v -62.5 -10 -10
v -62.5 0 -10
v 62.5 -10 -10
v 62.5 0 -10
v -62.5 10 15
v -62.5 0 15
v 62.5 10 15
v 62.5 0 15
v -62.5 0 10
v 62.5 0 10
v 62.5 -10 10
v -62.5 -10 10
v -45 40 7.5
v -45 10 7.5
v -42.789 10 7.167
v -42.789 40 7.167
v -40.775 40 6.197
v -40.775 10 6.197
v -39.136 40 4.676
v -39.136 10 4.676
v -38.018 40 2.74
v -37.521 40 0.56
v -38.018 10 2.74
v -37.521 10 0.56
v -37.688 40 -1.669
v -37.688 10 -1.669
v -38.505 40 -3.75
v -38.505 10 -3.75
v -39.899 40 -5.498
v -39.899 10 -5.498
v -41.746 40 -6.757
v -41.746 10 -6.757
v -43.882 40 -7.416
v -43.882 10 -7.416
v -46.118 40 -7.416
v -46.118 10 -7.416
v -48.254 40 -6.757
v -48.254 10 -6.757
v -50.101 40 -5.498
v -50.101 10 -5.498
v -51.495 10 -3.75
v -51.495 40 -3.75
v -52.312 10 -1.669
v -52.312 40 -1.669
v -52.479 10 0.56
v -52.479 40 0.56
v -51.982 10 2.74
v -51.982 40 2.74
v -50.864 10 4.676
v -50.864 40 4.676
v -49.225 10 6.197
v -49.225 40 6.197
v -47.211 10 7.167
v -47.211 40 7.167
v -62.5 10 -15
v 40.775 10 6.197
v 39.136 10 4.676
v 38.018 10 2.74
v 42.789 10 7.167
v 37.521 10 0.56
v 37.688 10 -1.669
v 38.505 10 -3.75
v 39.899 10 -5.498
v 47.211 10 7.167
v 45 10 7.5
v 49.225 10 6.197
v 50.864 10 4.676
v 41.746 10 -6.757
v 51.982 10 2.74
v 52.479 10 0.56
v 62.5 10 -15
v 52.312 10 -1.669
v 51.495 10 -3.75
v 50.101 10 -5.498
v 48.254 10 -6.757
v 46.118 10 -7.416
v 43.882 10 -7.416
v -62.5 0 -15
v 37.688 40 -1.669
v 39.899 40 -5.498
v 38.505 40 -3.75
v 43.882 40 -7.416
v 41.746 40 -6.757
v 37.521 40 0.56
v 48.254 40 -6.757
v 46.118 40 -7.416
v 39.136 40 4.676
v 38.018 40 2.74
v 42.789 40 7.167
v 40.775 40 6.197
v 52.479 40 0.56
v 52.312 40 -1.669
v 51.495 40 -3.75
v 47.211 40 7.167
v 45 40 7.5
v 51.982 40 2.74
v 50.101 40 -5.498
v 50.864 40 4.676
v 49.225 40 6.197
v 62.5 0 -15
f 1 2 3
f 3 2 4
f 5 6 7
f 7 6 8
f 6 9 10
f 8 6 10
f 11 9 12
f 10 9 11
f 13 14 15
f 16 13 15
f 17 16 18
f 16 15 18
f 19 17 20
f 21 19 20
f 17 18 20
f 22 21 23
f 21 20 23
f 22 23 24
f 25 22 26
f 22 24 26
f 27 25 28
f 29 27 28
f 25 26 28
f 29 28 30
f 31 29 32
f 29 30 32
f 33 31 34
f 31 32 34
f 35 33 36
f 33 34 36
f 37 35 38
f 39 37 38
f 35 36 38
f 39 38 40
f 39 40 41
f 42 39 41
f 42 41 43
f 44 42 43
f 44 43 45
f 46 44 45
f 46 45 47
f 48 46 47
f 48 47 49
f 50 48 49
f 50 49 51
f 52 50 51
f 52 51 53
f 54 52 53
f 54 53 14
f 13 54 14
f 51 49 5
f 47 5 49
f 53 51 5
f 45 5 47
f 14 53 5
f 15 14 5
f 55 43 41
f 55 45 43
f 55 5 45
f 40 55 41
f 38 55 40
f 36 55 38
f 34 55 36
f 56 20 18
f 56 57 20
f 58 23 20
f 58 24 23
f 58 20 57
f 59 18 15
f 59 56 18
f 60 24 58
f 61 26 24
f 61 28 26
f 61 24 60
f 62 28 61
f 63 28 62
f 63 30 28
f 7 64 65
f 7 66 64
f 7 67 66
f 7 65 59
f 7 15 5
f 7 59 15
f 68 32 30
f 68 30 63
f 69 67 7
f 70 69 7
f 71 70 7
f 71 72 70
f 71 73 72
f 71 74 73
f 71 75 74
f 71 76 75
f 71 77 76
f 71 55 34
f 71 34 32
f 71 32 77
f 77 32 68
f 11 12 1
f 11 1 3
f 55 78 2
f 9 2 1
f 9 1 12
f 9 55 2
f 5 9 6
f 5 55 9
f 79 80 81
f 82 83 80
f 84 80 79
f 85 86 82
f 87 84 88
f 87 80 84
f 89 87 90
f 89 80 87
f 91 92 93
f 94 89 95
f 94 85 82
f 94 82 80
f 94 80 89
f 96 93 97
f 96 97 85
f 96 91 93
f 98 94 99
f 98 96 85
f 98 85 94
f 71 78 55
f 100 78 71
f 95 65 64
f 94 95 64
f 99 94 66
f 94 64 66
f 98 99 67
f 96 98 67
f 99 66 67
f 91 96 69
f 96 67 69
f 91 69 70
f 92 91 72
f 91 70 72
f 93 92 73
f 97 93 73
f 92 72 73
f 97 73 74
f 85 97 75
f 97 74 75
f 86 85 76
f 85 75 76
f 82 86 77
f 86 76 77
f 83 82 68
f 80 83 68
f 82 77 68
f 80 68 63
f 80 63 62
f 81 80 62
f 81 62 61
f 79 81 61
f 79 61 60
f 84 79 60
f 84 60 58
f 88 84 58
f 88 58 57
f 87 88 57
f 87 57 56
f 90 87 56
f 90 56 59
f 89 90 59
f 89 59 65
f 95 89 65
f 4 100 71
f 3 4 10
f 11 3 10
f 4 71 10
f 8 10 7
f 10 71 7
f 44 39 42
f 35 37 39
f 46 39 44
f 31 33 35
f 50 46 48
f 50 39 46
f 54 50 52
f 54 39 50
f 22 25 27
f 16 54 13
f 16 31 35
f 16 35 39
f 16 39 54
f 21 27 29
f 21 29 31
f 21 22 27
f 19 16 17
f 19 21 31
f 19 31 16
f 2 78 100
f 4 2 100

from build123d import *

# Parameters (mm, degrees)
SKETCH1_W           = 125
SKETCH1_H           = 30
SKETCH1_R           = 7.5
BOSS_EXTRUDE1_DEPTH = 10
SKETCH3_W           = 125
SKETCH3_H           = 20
BOSS_EXTRUDE2_DEPTH = 10
SKETCH4_R           = 7.5
BOSS_EXTRUDE3_DEPTH = 40


with BuildPart() as part:
    # Sketch1 → Boss-Extrude1 (new body)
    with BuildSketch(Plane(origin=(0, 0, 0), x_dir=(1, 0, 0), z_dir=(0, 1, 0))):
        Rectangle(SKETCH1_W, SKETCH1_H)
        with Locations(Location((-45, 0, 0), (0, 0, 270))):
            Circle(SKETCH1_R, mode=Mode.SUBTRACT)
        with Locations(Location((45, 0, 0), (0, 0, 270))):
            Circle(SKETCH1_R, mode=Mode.SUBTRACT)
    extrude(amount=BOSS_EXTRUDE1_DEPTH)

    # Sketch3 → Boss-Extrude2 (add)
    with BuildSketch(Plane.XZ):
        Rectangle(SKETCH3_W, SKETCH3_H)
    extrude(amount=BOSS_EXTRUDE2_DEPTH)

    # Sketch4 → Boss-Extrude3 (add)
    with BuildSketch(Plane(origin=(0, 0, 0), x_dir=(1, 0, 0), z_dir=(0, 1, 0))):
        with Locations(Location((45, 0, 0), (0, 0, 270))):
            Circle(SKETCH4_R)
        with Locations(Location((-45, 0, 0), (0, 0, 270))):
            Circle(SKETCH4_R)
    extrude(amount=BOSS_EXTRUDE3_DEPTH)


solid = part.part
